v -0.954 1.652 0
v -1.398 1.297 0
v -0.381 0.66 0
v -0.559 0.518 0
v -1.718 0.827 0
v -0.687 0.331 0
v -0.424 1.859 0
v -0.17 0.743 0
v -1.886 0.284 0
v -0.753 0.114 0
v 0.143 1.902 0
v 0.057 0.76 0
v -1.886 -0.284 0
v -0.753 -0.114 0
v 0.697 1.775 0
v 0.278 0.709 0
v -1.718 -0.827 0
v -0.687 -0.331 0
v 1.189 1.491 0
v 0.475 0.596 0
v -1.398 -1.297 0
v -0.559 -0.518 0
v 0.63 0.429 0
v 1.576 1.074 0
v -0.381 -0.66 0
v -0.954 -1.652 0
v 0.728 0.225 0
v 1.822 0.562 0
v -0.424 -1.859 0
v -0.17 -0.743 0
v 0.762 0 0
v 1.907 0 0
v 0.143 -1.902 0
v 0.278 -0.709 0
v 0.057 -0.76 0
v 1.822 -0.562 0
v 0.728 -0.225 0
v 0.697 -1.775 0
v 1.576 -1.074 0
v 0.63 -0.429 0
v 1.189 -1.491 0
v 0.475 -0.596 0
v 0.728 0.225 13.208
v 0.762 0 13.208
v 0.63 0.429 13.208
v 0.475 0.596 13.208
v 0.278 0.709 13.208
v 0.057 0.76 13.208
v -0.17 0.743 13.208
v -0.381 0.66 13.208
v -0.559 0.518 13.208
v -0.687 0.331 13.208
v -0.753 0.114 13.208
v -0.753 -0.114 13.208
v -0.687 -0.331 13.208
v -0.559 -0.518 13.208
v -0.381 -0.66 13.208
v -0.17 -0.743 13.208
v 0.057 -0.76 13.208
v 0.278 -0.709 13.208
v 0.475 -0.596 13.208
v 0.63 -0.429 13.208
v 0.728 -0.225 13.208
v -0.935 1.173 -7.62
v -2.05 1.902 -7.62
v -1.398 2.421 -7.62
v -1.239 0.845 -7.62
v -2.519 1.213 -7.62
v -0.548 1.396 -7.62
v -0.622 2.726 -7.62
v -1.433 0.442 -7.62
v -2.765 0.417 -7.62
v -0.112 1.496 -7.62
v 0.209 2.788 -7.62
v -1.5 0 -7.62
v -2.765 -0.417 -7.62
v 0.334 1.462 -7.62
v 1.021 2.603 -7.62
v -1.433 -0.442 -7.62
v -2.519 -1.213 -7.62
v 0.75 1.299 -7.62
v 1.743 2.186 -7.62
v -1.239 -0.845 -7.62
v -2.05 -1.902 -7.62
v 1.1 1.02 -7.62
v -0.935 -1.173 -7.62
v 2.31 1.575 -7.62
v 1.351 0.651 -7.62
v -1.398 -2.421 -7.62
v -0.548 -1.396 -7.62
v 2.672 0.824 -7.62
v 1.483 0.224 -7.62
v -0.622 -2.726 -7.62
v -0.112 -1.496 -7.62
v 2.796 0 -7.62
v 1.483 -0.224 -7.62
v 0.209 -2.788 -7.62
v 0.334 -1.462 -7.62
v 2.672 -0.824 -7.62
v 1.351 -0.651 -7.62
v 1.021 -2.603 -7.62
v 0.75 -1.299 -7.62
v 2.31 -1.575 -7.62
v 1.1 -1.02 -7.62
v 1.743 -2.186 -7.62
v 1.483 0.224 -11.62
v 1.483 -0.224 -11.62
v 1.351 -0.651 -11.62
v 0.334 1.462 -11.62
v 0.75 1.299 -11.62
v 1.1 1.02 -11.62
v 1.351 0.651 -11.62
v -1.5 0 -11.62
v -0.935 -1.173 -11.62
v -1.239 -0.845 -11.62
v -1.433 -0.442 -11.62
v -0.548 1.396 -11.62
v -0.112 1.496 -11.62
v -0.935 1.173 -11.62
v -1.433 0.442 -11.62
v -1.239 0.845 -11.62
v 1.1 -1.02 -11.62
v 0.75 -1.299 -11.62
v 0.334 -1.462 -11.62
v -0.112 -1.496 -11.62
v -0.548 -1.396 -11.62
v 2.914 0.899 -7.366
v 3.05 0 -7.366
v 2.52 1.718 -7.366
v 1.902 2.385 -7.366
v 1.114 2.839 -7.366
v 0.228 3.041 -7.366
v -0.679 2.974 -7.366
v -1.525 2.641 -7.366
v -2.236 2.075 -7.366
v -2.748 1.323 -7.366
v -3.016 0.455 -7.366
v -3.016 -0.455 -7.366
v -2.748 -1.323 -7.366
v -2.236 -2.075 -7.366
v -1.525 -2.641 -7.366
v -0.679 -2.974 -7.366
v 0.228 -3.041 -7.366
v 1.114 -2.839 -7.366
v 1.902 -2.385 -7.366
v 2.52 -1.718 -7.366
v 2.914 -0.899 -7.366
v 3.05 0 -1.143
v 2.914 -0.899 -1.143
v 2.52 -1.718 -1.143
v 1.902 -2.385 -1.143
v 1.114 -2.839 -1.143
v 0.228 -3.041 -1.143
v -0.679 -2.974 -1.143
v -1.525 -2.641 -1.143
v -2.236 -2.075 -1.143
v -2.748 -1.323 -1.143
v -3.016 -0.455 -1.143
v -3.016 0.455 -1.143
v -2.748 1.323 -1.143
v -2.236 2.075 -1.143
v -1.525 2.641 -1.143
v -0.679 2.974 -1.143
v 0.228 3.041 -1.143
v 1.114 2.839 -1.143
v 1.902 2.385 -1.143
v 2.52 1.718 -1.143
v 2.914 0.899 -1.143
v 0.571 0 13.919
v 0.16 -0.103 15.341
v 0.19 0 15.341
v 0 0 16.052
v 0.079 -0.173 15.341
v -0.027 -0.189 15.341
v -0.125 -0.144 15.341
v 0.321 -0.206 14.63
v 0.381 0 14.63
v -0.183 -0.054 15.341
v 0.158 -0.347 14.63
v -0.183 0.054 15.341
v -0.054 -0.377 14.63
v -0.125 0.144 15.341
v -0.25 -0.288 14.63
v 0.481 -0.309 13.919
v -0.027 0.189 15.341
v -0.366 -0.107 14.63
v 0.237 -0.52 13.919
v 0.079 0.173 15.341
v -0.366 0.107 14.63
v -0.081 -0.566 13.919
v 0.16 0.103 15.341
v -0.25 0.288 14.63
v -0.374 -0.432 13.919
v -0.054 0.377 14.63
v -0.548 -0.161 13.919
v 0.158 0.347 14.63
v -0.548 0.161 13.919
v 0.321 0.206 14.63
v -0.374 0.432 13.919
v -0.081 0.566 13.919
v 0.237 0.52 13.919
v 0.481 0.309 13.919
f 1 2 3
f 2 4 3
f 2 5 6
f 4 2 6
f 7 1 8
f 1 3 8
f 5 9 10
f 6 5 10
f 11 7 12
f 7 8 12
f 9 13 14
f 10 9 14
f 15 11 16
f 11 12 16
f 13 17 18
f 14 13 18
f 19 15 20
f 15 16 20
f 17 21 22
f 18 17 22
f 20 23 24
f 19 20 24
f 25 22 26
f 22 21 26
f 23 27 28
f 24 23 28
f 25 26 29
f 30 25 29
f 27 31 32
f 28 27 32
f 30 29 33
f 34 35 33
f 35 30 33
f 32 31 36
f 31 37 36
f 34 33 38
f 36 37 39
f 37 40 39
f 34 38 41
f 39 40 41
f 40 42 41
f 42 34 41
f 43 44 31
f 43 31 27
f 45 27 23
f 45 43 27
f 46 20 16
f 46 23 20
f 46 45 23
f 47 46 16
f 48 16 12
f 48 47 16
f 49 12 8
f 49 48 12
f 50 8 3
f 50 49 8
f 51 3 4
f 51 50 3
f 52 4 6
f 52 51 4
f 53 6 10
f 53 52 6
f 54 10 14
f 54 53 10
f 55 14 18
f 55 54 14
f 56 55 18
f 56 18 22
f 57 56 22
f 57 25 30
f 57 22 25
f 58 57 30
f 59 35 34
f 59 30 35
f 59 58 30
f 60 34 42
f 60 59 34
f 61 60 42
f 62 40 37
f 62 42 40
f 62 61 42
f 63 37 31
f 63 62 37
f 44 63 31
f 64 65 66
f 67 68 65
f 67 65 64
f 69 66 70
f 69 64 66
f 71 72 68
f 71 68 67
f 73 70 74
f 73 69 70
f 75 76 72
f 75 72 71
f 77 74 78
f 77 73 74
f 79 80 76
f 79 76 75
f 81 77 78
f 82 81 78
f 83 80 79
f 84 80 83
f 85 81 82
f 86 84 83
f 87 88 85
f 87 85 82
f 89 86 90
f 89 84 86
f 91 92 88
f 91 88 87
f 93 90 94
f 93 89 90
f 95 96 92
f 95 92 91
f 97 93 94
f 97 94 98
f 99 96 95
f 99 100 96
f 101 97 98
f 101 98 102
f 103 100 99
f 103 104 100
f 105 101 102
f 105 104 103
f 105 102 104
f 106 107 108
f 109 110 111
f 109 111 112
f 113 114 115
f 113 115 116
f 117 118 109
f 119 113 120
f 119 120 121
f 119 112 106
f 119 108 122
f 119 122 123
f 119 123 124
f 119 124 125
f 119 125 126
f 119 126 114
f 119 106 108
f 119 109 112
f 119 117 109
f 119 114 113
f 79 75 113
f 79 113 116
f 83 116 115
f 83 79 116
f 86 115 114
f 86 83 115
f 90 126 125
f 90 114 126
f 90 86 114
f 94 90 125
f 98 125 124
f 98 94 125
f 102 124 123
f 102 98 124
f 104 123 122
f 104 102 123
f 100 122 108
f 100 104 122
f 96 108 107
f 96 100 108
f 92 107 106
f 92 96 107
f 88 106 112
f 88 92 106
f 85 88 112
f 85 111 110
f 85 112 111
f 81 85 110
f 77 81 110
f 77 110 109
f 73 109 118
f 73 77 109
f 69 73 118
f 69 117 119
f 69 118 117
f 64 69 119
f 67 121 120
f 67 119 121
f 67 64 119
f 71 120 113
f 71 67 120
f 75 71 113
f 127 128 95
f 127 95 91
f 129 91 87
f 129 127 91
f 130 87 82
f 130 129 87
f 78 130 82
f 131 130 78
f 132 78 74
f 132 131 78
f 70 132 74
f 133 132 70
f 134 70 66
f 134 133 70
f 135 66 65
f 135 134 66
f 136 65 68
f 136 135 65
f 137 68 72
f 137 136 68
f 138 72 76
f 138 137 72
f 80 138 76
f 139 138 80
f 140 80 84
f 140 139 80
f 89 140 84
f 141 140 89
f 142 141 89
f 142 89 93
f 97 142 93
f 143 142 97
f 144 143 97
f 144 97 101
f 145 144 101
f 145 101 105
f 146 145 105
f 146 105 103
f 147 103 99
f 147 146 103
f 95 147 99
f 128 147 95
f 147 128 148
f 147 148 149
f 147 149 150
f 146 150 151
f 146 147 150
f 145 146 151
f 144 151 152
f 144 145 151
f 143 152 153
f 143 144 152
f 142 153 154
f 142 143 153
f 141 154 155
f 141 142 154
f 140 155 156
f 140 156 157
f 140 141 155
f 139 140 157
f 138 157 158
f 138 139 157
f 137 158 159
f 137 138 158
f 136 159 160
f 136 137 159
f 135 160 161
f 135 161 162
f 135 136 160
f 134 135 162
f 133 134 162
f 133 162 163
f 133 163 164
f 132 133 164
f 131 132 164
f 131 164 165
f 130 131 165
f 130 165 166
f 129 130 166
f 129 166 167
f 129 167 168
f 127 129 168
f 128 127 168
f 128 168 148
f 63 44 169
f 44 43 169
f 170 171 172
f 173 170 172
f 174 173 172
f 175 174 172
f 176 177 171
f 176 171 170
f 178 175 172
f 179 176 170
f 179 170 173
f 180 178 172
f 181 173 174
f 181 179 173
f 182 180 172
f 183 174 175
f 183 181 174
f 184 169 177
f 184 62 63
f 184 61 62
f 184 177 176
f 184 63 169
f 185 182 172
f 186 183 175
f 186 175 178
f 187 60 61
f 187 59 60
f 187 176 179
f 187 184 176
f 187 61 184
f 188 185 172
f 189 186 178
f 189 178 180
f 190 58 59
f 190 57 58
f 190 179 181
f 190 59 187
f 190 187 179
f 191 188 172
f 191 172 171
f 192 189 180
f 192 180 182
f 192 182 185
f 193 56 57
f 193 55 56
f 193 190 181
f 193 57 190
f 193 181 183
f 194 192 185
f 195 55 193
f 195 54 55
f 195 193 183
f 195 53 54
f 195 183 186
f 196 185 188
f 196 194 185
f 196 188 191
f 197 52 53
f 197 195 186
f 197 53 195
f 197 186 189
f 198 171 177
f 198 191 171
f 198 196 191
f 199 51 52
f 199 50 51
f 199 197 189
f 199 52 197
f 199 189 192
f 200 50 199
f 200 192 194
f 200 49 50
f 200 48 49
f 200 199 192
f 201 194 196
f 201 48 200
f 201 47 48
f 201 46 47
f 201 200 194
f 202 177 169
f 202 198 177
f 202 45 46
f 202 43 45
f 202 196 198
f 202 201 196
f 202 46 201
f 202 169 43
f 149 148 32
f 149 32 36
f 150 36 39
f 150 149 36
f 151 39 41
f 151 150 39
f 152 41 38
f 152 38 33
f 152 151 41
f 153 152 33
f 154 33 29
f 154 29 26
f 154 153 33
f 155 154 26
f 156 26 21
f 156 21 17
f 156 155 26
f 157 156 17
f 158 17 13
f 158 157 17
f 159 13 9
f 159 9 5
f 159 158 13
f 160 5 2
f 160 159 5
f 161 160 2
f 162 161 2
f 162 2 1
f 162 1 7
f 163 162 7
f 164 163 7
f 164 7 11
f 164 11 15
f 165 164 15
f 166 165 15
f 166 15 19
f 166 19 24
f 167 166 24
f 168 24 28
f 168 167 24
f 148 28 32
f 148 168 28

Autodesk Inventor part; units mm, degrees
ref_plane "YZ Plane" through (0, 0, 0) normal (1, 0, 0) x (0, 1, 0)
ref_plane "XZ Plane" through (0, 0, 0) normal (0, 1, 0) x (-1, 0, 0)
ref_plane "XY Plane" through (0, 0, 0) normal (0, 0, 1) x (1, 0, 0)
sketch "Sketch1" plane through (0, 0, 0) normal (0, 1, 0) x (-1, 0, 0)
  line L0 (0, 0) -> (-3.05, 0)
  line L1 (-3.05, 0) -> (-3.05, -7.62)
  line L2 (-3.05, -7.62) -> (0, -7.62)
  line L3 (0, -7.62) -> (0, 0)
  line L4 (0, 0) -> (-0.762, 0)
  line L5 (-0.762, 0) -> (-0.762, 13.208)
  line L6 (-0.762, 13.208) -> (0, 13.208)
  line L7 (0, 13.208) -> (0, 0)
  line L8 (-0.762, 13.208) -> (0, 16.0518)
  line L9 (-0.762, 13.208) -> (2.1821, 13.208) construction
  line L10 (0, 16.0518) -> (0, 13.208)
  dimension "d0" = 3.05
  dimension "d1" = 7.62
  dimension "d2" = 0.762
  dimension "d3" = 13.208
  dimension "d13" = 75
  dimension "d14" = 15
  dimension "d15" = 16.0518
  dimension "d16" = 23.6718
revolve "Revolution1" add sketch "Sketch1" angle 360 about axis through (0, 0, 13.208) along (0, 0, -1)
sketch "Sketch2" plane through (0, 0, -7.62) normal (0, 0, -1) x (-1, 0, 0)
  circle A0 centre (0, 0) radius 3.05 projected
  circle A1 centre (0, 0) radius 1.5
  dimension "d5" = 3
extrude "Extrusion1" add sketch "Sketch2" along normal blind 4 contours A1
chamfer "Chamfer1" distance 1.143 angle 45 1 edges at (-3.05, 0, 0)
chamfer "Chamfer2" distance 0.254 angle 45 1 edges at (-3.05, 0, -7.62)
thread "Thread1" size "M3x0.5" class "6g" standard "ANSI Metric M Profile" full length
properties part number "carbide_probe_30deg_tip_r01" material "Steel, High Strength, Low Alloy"
